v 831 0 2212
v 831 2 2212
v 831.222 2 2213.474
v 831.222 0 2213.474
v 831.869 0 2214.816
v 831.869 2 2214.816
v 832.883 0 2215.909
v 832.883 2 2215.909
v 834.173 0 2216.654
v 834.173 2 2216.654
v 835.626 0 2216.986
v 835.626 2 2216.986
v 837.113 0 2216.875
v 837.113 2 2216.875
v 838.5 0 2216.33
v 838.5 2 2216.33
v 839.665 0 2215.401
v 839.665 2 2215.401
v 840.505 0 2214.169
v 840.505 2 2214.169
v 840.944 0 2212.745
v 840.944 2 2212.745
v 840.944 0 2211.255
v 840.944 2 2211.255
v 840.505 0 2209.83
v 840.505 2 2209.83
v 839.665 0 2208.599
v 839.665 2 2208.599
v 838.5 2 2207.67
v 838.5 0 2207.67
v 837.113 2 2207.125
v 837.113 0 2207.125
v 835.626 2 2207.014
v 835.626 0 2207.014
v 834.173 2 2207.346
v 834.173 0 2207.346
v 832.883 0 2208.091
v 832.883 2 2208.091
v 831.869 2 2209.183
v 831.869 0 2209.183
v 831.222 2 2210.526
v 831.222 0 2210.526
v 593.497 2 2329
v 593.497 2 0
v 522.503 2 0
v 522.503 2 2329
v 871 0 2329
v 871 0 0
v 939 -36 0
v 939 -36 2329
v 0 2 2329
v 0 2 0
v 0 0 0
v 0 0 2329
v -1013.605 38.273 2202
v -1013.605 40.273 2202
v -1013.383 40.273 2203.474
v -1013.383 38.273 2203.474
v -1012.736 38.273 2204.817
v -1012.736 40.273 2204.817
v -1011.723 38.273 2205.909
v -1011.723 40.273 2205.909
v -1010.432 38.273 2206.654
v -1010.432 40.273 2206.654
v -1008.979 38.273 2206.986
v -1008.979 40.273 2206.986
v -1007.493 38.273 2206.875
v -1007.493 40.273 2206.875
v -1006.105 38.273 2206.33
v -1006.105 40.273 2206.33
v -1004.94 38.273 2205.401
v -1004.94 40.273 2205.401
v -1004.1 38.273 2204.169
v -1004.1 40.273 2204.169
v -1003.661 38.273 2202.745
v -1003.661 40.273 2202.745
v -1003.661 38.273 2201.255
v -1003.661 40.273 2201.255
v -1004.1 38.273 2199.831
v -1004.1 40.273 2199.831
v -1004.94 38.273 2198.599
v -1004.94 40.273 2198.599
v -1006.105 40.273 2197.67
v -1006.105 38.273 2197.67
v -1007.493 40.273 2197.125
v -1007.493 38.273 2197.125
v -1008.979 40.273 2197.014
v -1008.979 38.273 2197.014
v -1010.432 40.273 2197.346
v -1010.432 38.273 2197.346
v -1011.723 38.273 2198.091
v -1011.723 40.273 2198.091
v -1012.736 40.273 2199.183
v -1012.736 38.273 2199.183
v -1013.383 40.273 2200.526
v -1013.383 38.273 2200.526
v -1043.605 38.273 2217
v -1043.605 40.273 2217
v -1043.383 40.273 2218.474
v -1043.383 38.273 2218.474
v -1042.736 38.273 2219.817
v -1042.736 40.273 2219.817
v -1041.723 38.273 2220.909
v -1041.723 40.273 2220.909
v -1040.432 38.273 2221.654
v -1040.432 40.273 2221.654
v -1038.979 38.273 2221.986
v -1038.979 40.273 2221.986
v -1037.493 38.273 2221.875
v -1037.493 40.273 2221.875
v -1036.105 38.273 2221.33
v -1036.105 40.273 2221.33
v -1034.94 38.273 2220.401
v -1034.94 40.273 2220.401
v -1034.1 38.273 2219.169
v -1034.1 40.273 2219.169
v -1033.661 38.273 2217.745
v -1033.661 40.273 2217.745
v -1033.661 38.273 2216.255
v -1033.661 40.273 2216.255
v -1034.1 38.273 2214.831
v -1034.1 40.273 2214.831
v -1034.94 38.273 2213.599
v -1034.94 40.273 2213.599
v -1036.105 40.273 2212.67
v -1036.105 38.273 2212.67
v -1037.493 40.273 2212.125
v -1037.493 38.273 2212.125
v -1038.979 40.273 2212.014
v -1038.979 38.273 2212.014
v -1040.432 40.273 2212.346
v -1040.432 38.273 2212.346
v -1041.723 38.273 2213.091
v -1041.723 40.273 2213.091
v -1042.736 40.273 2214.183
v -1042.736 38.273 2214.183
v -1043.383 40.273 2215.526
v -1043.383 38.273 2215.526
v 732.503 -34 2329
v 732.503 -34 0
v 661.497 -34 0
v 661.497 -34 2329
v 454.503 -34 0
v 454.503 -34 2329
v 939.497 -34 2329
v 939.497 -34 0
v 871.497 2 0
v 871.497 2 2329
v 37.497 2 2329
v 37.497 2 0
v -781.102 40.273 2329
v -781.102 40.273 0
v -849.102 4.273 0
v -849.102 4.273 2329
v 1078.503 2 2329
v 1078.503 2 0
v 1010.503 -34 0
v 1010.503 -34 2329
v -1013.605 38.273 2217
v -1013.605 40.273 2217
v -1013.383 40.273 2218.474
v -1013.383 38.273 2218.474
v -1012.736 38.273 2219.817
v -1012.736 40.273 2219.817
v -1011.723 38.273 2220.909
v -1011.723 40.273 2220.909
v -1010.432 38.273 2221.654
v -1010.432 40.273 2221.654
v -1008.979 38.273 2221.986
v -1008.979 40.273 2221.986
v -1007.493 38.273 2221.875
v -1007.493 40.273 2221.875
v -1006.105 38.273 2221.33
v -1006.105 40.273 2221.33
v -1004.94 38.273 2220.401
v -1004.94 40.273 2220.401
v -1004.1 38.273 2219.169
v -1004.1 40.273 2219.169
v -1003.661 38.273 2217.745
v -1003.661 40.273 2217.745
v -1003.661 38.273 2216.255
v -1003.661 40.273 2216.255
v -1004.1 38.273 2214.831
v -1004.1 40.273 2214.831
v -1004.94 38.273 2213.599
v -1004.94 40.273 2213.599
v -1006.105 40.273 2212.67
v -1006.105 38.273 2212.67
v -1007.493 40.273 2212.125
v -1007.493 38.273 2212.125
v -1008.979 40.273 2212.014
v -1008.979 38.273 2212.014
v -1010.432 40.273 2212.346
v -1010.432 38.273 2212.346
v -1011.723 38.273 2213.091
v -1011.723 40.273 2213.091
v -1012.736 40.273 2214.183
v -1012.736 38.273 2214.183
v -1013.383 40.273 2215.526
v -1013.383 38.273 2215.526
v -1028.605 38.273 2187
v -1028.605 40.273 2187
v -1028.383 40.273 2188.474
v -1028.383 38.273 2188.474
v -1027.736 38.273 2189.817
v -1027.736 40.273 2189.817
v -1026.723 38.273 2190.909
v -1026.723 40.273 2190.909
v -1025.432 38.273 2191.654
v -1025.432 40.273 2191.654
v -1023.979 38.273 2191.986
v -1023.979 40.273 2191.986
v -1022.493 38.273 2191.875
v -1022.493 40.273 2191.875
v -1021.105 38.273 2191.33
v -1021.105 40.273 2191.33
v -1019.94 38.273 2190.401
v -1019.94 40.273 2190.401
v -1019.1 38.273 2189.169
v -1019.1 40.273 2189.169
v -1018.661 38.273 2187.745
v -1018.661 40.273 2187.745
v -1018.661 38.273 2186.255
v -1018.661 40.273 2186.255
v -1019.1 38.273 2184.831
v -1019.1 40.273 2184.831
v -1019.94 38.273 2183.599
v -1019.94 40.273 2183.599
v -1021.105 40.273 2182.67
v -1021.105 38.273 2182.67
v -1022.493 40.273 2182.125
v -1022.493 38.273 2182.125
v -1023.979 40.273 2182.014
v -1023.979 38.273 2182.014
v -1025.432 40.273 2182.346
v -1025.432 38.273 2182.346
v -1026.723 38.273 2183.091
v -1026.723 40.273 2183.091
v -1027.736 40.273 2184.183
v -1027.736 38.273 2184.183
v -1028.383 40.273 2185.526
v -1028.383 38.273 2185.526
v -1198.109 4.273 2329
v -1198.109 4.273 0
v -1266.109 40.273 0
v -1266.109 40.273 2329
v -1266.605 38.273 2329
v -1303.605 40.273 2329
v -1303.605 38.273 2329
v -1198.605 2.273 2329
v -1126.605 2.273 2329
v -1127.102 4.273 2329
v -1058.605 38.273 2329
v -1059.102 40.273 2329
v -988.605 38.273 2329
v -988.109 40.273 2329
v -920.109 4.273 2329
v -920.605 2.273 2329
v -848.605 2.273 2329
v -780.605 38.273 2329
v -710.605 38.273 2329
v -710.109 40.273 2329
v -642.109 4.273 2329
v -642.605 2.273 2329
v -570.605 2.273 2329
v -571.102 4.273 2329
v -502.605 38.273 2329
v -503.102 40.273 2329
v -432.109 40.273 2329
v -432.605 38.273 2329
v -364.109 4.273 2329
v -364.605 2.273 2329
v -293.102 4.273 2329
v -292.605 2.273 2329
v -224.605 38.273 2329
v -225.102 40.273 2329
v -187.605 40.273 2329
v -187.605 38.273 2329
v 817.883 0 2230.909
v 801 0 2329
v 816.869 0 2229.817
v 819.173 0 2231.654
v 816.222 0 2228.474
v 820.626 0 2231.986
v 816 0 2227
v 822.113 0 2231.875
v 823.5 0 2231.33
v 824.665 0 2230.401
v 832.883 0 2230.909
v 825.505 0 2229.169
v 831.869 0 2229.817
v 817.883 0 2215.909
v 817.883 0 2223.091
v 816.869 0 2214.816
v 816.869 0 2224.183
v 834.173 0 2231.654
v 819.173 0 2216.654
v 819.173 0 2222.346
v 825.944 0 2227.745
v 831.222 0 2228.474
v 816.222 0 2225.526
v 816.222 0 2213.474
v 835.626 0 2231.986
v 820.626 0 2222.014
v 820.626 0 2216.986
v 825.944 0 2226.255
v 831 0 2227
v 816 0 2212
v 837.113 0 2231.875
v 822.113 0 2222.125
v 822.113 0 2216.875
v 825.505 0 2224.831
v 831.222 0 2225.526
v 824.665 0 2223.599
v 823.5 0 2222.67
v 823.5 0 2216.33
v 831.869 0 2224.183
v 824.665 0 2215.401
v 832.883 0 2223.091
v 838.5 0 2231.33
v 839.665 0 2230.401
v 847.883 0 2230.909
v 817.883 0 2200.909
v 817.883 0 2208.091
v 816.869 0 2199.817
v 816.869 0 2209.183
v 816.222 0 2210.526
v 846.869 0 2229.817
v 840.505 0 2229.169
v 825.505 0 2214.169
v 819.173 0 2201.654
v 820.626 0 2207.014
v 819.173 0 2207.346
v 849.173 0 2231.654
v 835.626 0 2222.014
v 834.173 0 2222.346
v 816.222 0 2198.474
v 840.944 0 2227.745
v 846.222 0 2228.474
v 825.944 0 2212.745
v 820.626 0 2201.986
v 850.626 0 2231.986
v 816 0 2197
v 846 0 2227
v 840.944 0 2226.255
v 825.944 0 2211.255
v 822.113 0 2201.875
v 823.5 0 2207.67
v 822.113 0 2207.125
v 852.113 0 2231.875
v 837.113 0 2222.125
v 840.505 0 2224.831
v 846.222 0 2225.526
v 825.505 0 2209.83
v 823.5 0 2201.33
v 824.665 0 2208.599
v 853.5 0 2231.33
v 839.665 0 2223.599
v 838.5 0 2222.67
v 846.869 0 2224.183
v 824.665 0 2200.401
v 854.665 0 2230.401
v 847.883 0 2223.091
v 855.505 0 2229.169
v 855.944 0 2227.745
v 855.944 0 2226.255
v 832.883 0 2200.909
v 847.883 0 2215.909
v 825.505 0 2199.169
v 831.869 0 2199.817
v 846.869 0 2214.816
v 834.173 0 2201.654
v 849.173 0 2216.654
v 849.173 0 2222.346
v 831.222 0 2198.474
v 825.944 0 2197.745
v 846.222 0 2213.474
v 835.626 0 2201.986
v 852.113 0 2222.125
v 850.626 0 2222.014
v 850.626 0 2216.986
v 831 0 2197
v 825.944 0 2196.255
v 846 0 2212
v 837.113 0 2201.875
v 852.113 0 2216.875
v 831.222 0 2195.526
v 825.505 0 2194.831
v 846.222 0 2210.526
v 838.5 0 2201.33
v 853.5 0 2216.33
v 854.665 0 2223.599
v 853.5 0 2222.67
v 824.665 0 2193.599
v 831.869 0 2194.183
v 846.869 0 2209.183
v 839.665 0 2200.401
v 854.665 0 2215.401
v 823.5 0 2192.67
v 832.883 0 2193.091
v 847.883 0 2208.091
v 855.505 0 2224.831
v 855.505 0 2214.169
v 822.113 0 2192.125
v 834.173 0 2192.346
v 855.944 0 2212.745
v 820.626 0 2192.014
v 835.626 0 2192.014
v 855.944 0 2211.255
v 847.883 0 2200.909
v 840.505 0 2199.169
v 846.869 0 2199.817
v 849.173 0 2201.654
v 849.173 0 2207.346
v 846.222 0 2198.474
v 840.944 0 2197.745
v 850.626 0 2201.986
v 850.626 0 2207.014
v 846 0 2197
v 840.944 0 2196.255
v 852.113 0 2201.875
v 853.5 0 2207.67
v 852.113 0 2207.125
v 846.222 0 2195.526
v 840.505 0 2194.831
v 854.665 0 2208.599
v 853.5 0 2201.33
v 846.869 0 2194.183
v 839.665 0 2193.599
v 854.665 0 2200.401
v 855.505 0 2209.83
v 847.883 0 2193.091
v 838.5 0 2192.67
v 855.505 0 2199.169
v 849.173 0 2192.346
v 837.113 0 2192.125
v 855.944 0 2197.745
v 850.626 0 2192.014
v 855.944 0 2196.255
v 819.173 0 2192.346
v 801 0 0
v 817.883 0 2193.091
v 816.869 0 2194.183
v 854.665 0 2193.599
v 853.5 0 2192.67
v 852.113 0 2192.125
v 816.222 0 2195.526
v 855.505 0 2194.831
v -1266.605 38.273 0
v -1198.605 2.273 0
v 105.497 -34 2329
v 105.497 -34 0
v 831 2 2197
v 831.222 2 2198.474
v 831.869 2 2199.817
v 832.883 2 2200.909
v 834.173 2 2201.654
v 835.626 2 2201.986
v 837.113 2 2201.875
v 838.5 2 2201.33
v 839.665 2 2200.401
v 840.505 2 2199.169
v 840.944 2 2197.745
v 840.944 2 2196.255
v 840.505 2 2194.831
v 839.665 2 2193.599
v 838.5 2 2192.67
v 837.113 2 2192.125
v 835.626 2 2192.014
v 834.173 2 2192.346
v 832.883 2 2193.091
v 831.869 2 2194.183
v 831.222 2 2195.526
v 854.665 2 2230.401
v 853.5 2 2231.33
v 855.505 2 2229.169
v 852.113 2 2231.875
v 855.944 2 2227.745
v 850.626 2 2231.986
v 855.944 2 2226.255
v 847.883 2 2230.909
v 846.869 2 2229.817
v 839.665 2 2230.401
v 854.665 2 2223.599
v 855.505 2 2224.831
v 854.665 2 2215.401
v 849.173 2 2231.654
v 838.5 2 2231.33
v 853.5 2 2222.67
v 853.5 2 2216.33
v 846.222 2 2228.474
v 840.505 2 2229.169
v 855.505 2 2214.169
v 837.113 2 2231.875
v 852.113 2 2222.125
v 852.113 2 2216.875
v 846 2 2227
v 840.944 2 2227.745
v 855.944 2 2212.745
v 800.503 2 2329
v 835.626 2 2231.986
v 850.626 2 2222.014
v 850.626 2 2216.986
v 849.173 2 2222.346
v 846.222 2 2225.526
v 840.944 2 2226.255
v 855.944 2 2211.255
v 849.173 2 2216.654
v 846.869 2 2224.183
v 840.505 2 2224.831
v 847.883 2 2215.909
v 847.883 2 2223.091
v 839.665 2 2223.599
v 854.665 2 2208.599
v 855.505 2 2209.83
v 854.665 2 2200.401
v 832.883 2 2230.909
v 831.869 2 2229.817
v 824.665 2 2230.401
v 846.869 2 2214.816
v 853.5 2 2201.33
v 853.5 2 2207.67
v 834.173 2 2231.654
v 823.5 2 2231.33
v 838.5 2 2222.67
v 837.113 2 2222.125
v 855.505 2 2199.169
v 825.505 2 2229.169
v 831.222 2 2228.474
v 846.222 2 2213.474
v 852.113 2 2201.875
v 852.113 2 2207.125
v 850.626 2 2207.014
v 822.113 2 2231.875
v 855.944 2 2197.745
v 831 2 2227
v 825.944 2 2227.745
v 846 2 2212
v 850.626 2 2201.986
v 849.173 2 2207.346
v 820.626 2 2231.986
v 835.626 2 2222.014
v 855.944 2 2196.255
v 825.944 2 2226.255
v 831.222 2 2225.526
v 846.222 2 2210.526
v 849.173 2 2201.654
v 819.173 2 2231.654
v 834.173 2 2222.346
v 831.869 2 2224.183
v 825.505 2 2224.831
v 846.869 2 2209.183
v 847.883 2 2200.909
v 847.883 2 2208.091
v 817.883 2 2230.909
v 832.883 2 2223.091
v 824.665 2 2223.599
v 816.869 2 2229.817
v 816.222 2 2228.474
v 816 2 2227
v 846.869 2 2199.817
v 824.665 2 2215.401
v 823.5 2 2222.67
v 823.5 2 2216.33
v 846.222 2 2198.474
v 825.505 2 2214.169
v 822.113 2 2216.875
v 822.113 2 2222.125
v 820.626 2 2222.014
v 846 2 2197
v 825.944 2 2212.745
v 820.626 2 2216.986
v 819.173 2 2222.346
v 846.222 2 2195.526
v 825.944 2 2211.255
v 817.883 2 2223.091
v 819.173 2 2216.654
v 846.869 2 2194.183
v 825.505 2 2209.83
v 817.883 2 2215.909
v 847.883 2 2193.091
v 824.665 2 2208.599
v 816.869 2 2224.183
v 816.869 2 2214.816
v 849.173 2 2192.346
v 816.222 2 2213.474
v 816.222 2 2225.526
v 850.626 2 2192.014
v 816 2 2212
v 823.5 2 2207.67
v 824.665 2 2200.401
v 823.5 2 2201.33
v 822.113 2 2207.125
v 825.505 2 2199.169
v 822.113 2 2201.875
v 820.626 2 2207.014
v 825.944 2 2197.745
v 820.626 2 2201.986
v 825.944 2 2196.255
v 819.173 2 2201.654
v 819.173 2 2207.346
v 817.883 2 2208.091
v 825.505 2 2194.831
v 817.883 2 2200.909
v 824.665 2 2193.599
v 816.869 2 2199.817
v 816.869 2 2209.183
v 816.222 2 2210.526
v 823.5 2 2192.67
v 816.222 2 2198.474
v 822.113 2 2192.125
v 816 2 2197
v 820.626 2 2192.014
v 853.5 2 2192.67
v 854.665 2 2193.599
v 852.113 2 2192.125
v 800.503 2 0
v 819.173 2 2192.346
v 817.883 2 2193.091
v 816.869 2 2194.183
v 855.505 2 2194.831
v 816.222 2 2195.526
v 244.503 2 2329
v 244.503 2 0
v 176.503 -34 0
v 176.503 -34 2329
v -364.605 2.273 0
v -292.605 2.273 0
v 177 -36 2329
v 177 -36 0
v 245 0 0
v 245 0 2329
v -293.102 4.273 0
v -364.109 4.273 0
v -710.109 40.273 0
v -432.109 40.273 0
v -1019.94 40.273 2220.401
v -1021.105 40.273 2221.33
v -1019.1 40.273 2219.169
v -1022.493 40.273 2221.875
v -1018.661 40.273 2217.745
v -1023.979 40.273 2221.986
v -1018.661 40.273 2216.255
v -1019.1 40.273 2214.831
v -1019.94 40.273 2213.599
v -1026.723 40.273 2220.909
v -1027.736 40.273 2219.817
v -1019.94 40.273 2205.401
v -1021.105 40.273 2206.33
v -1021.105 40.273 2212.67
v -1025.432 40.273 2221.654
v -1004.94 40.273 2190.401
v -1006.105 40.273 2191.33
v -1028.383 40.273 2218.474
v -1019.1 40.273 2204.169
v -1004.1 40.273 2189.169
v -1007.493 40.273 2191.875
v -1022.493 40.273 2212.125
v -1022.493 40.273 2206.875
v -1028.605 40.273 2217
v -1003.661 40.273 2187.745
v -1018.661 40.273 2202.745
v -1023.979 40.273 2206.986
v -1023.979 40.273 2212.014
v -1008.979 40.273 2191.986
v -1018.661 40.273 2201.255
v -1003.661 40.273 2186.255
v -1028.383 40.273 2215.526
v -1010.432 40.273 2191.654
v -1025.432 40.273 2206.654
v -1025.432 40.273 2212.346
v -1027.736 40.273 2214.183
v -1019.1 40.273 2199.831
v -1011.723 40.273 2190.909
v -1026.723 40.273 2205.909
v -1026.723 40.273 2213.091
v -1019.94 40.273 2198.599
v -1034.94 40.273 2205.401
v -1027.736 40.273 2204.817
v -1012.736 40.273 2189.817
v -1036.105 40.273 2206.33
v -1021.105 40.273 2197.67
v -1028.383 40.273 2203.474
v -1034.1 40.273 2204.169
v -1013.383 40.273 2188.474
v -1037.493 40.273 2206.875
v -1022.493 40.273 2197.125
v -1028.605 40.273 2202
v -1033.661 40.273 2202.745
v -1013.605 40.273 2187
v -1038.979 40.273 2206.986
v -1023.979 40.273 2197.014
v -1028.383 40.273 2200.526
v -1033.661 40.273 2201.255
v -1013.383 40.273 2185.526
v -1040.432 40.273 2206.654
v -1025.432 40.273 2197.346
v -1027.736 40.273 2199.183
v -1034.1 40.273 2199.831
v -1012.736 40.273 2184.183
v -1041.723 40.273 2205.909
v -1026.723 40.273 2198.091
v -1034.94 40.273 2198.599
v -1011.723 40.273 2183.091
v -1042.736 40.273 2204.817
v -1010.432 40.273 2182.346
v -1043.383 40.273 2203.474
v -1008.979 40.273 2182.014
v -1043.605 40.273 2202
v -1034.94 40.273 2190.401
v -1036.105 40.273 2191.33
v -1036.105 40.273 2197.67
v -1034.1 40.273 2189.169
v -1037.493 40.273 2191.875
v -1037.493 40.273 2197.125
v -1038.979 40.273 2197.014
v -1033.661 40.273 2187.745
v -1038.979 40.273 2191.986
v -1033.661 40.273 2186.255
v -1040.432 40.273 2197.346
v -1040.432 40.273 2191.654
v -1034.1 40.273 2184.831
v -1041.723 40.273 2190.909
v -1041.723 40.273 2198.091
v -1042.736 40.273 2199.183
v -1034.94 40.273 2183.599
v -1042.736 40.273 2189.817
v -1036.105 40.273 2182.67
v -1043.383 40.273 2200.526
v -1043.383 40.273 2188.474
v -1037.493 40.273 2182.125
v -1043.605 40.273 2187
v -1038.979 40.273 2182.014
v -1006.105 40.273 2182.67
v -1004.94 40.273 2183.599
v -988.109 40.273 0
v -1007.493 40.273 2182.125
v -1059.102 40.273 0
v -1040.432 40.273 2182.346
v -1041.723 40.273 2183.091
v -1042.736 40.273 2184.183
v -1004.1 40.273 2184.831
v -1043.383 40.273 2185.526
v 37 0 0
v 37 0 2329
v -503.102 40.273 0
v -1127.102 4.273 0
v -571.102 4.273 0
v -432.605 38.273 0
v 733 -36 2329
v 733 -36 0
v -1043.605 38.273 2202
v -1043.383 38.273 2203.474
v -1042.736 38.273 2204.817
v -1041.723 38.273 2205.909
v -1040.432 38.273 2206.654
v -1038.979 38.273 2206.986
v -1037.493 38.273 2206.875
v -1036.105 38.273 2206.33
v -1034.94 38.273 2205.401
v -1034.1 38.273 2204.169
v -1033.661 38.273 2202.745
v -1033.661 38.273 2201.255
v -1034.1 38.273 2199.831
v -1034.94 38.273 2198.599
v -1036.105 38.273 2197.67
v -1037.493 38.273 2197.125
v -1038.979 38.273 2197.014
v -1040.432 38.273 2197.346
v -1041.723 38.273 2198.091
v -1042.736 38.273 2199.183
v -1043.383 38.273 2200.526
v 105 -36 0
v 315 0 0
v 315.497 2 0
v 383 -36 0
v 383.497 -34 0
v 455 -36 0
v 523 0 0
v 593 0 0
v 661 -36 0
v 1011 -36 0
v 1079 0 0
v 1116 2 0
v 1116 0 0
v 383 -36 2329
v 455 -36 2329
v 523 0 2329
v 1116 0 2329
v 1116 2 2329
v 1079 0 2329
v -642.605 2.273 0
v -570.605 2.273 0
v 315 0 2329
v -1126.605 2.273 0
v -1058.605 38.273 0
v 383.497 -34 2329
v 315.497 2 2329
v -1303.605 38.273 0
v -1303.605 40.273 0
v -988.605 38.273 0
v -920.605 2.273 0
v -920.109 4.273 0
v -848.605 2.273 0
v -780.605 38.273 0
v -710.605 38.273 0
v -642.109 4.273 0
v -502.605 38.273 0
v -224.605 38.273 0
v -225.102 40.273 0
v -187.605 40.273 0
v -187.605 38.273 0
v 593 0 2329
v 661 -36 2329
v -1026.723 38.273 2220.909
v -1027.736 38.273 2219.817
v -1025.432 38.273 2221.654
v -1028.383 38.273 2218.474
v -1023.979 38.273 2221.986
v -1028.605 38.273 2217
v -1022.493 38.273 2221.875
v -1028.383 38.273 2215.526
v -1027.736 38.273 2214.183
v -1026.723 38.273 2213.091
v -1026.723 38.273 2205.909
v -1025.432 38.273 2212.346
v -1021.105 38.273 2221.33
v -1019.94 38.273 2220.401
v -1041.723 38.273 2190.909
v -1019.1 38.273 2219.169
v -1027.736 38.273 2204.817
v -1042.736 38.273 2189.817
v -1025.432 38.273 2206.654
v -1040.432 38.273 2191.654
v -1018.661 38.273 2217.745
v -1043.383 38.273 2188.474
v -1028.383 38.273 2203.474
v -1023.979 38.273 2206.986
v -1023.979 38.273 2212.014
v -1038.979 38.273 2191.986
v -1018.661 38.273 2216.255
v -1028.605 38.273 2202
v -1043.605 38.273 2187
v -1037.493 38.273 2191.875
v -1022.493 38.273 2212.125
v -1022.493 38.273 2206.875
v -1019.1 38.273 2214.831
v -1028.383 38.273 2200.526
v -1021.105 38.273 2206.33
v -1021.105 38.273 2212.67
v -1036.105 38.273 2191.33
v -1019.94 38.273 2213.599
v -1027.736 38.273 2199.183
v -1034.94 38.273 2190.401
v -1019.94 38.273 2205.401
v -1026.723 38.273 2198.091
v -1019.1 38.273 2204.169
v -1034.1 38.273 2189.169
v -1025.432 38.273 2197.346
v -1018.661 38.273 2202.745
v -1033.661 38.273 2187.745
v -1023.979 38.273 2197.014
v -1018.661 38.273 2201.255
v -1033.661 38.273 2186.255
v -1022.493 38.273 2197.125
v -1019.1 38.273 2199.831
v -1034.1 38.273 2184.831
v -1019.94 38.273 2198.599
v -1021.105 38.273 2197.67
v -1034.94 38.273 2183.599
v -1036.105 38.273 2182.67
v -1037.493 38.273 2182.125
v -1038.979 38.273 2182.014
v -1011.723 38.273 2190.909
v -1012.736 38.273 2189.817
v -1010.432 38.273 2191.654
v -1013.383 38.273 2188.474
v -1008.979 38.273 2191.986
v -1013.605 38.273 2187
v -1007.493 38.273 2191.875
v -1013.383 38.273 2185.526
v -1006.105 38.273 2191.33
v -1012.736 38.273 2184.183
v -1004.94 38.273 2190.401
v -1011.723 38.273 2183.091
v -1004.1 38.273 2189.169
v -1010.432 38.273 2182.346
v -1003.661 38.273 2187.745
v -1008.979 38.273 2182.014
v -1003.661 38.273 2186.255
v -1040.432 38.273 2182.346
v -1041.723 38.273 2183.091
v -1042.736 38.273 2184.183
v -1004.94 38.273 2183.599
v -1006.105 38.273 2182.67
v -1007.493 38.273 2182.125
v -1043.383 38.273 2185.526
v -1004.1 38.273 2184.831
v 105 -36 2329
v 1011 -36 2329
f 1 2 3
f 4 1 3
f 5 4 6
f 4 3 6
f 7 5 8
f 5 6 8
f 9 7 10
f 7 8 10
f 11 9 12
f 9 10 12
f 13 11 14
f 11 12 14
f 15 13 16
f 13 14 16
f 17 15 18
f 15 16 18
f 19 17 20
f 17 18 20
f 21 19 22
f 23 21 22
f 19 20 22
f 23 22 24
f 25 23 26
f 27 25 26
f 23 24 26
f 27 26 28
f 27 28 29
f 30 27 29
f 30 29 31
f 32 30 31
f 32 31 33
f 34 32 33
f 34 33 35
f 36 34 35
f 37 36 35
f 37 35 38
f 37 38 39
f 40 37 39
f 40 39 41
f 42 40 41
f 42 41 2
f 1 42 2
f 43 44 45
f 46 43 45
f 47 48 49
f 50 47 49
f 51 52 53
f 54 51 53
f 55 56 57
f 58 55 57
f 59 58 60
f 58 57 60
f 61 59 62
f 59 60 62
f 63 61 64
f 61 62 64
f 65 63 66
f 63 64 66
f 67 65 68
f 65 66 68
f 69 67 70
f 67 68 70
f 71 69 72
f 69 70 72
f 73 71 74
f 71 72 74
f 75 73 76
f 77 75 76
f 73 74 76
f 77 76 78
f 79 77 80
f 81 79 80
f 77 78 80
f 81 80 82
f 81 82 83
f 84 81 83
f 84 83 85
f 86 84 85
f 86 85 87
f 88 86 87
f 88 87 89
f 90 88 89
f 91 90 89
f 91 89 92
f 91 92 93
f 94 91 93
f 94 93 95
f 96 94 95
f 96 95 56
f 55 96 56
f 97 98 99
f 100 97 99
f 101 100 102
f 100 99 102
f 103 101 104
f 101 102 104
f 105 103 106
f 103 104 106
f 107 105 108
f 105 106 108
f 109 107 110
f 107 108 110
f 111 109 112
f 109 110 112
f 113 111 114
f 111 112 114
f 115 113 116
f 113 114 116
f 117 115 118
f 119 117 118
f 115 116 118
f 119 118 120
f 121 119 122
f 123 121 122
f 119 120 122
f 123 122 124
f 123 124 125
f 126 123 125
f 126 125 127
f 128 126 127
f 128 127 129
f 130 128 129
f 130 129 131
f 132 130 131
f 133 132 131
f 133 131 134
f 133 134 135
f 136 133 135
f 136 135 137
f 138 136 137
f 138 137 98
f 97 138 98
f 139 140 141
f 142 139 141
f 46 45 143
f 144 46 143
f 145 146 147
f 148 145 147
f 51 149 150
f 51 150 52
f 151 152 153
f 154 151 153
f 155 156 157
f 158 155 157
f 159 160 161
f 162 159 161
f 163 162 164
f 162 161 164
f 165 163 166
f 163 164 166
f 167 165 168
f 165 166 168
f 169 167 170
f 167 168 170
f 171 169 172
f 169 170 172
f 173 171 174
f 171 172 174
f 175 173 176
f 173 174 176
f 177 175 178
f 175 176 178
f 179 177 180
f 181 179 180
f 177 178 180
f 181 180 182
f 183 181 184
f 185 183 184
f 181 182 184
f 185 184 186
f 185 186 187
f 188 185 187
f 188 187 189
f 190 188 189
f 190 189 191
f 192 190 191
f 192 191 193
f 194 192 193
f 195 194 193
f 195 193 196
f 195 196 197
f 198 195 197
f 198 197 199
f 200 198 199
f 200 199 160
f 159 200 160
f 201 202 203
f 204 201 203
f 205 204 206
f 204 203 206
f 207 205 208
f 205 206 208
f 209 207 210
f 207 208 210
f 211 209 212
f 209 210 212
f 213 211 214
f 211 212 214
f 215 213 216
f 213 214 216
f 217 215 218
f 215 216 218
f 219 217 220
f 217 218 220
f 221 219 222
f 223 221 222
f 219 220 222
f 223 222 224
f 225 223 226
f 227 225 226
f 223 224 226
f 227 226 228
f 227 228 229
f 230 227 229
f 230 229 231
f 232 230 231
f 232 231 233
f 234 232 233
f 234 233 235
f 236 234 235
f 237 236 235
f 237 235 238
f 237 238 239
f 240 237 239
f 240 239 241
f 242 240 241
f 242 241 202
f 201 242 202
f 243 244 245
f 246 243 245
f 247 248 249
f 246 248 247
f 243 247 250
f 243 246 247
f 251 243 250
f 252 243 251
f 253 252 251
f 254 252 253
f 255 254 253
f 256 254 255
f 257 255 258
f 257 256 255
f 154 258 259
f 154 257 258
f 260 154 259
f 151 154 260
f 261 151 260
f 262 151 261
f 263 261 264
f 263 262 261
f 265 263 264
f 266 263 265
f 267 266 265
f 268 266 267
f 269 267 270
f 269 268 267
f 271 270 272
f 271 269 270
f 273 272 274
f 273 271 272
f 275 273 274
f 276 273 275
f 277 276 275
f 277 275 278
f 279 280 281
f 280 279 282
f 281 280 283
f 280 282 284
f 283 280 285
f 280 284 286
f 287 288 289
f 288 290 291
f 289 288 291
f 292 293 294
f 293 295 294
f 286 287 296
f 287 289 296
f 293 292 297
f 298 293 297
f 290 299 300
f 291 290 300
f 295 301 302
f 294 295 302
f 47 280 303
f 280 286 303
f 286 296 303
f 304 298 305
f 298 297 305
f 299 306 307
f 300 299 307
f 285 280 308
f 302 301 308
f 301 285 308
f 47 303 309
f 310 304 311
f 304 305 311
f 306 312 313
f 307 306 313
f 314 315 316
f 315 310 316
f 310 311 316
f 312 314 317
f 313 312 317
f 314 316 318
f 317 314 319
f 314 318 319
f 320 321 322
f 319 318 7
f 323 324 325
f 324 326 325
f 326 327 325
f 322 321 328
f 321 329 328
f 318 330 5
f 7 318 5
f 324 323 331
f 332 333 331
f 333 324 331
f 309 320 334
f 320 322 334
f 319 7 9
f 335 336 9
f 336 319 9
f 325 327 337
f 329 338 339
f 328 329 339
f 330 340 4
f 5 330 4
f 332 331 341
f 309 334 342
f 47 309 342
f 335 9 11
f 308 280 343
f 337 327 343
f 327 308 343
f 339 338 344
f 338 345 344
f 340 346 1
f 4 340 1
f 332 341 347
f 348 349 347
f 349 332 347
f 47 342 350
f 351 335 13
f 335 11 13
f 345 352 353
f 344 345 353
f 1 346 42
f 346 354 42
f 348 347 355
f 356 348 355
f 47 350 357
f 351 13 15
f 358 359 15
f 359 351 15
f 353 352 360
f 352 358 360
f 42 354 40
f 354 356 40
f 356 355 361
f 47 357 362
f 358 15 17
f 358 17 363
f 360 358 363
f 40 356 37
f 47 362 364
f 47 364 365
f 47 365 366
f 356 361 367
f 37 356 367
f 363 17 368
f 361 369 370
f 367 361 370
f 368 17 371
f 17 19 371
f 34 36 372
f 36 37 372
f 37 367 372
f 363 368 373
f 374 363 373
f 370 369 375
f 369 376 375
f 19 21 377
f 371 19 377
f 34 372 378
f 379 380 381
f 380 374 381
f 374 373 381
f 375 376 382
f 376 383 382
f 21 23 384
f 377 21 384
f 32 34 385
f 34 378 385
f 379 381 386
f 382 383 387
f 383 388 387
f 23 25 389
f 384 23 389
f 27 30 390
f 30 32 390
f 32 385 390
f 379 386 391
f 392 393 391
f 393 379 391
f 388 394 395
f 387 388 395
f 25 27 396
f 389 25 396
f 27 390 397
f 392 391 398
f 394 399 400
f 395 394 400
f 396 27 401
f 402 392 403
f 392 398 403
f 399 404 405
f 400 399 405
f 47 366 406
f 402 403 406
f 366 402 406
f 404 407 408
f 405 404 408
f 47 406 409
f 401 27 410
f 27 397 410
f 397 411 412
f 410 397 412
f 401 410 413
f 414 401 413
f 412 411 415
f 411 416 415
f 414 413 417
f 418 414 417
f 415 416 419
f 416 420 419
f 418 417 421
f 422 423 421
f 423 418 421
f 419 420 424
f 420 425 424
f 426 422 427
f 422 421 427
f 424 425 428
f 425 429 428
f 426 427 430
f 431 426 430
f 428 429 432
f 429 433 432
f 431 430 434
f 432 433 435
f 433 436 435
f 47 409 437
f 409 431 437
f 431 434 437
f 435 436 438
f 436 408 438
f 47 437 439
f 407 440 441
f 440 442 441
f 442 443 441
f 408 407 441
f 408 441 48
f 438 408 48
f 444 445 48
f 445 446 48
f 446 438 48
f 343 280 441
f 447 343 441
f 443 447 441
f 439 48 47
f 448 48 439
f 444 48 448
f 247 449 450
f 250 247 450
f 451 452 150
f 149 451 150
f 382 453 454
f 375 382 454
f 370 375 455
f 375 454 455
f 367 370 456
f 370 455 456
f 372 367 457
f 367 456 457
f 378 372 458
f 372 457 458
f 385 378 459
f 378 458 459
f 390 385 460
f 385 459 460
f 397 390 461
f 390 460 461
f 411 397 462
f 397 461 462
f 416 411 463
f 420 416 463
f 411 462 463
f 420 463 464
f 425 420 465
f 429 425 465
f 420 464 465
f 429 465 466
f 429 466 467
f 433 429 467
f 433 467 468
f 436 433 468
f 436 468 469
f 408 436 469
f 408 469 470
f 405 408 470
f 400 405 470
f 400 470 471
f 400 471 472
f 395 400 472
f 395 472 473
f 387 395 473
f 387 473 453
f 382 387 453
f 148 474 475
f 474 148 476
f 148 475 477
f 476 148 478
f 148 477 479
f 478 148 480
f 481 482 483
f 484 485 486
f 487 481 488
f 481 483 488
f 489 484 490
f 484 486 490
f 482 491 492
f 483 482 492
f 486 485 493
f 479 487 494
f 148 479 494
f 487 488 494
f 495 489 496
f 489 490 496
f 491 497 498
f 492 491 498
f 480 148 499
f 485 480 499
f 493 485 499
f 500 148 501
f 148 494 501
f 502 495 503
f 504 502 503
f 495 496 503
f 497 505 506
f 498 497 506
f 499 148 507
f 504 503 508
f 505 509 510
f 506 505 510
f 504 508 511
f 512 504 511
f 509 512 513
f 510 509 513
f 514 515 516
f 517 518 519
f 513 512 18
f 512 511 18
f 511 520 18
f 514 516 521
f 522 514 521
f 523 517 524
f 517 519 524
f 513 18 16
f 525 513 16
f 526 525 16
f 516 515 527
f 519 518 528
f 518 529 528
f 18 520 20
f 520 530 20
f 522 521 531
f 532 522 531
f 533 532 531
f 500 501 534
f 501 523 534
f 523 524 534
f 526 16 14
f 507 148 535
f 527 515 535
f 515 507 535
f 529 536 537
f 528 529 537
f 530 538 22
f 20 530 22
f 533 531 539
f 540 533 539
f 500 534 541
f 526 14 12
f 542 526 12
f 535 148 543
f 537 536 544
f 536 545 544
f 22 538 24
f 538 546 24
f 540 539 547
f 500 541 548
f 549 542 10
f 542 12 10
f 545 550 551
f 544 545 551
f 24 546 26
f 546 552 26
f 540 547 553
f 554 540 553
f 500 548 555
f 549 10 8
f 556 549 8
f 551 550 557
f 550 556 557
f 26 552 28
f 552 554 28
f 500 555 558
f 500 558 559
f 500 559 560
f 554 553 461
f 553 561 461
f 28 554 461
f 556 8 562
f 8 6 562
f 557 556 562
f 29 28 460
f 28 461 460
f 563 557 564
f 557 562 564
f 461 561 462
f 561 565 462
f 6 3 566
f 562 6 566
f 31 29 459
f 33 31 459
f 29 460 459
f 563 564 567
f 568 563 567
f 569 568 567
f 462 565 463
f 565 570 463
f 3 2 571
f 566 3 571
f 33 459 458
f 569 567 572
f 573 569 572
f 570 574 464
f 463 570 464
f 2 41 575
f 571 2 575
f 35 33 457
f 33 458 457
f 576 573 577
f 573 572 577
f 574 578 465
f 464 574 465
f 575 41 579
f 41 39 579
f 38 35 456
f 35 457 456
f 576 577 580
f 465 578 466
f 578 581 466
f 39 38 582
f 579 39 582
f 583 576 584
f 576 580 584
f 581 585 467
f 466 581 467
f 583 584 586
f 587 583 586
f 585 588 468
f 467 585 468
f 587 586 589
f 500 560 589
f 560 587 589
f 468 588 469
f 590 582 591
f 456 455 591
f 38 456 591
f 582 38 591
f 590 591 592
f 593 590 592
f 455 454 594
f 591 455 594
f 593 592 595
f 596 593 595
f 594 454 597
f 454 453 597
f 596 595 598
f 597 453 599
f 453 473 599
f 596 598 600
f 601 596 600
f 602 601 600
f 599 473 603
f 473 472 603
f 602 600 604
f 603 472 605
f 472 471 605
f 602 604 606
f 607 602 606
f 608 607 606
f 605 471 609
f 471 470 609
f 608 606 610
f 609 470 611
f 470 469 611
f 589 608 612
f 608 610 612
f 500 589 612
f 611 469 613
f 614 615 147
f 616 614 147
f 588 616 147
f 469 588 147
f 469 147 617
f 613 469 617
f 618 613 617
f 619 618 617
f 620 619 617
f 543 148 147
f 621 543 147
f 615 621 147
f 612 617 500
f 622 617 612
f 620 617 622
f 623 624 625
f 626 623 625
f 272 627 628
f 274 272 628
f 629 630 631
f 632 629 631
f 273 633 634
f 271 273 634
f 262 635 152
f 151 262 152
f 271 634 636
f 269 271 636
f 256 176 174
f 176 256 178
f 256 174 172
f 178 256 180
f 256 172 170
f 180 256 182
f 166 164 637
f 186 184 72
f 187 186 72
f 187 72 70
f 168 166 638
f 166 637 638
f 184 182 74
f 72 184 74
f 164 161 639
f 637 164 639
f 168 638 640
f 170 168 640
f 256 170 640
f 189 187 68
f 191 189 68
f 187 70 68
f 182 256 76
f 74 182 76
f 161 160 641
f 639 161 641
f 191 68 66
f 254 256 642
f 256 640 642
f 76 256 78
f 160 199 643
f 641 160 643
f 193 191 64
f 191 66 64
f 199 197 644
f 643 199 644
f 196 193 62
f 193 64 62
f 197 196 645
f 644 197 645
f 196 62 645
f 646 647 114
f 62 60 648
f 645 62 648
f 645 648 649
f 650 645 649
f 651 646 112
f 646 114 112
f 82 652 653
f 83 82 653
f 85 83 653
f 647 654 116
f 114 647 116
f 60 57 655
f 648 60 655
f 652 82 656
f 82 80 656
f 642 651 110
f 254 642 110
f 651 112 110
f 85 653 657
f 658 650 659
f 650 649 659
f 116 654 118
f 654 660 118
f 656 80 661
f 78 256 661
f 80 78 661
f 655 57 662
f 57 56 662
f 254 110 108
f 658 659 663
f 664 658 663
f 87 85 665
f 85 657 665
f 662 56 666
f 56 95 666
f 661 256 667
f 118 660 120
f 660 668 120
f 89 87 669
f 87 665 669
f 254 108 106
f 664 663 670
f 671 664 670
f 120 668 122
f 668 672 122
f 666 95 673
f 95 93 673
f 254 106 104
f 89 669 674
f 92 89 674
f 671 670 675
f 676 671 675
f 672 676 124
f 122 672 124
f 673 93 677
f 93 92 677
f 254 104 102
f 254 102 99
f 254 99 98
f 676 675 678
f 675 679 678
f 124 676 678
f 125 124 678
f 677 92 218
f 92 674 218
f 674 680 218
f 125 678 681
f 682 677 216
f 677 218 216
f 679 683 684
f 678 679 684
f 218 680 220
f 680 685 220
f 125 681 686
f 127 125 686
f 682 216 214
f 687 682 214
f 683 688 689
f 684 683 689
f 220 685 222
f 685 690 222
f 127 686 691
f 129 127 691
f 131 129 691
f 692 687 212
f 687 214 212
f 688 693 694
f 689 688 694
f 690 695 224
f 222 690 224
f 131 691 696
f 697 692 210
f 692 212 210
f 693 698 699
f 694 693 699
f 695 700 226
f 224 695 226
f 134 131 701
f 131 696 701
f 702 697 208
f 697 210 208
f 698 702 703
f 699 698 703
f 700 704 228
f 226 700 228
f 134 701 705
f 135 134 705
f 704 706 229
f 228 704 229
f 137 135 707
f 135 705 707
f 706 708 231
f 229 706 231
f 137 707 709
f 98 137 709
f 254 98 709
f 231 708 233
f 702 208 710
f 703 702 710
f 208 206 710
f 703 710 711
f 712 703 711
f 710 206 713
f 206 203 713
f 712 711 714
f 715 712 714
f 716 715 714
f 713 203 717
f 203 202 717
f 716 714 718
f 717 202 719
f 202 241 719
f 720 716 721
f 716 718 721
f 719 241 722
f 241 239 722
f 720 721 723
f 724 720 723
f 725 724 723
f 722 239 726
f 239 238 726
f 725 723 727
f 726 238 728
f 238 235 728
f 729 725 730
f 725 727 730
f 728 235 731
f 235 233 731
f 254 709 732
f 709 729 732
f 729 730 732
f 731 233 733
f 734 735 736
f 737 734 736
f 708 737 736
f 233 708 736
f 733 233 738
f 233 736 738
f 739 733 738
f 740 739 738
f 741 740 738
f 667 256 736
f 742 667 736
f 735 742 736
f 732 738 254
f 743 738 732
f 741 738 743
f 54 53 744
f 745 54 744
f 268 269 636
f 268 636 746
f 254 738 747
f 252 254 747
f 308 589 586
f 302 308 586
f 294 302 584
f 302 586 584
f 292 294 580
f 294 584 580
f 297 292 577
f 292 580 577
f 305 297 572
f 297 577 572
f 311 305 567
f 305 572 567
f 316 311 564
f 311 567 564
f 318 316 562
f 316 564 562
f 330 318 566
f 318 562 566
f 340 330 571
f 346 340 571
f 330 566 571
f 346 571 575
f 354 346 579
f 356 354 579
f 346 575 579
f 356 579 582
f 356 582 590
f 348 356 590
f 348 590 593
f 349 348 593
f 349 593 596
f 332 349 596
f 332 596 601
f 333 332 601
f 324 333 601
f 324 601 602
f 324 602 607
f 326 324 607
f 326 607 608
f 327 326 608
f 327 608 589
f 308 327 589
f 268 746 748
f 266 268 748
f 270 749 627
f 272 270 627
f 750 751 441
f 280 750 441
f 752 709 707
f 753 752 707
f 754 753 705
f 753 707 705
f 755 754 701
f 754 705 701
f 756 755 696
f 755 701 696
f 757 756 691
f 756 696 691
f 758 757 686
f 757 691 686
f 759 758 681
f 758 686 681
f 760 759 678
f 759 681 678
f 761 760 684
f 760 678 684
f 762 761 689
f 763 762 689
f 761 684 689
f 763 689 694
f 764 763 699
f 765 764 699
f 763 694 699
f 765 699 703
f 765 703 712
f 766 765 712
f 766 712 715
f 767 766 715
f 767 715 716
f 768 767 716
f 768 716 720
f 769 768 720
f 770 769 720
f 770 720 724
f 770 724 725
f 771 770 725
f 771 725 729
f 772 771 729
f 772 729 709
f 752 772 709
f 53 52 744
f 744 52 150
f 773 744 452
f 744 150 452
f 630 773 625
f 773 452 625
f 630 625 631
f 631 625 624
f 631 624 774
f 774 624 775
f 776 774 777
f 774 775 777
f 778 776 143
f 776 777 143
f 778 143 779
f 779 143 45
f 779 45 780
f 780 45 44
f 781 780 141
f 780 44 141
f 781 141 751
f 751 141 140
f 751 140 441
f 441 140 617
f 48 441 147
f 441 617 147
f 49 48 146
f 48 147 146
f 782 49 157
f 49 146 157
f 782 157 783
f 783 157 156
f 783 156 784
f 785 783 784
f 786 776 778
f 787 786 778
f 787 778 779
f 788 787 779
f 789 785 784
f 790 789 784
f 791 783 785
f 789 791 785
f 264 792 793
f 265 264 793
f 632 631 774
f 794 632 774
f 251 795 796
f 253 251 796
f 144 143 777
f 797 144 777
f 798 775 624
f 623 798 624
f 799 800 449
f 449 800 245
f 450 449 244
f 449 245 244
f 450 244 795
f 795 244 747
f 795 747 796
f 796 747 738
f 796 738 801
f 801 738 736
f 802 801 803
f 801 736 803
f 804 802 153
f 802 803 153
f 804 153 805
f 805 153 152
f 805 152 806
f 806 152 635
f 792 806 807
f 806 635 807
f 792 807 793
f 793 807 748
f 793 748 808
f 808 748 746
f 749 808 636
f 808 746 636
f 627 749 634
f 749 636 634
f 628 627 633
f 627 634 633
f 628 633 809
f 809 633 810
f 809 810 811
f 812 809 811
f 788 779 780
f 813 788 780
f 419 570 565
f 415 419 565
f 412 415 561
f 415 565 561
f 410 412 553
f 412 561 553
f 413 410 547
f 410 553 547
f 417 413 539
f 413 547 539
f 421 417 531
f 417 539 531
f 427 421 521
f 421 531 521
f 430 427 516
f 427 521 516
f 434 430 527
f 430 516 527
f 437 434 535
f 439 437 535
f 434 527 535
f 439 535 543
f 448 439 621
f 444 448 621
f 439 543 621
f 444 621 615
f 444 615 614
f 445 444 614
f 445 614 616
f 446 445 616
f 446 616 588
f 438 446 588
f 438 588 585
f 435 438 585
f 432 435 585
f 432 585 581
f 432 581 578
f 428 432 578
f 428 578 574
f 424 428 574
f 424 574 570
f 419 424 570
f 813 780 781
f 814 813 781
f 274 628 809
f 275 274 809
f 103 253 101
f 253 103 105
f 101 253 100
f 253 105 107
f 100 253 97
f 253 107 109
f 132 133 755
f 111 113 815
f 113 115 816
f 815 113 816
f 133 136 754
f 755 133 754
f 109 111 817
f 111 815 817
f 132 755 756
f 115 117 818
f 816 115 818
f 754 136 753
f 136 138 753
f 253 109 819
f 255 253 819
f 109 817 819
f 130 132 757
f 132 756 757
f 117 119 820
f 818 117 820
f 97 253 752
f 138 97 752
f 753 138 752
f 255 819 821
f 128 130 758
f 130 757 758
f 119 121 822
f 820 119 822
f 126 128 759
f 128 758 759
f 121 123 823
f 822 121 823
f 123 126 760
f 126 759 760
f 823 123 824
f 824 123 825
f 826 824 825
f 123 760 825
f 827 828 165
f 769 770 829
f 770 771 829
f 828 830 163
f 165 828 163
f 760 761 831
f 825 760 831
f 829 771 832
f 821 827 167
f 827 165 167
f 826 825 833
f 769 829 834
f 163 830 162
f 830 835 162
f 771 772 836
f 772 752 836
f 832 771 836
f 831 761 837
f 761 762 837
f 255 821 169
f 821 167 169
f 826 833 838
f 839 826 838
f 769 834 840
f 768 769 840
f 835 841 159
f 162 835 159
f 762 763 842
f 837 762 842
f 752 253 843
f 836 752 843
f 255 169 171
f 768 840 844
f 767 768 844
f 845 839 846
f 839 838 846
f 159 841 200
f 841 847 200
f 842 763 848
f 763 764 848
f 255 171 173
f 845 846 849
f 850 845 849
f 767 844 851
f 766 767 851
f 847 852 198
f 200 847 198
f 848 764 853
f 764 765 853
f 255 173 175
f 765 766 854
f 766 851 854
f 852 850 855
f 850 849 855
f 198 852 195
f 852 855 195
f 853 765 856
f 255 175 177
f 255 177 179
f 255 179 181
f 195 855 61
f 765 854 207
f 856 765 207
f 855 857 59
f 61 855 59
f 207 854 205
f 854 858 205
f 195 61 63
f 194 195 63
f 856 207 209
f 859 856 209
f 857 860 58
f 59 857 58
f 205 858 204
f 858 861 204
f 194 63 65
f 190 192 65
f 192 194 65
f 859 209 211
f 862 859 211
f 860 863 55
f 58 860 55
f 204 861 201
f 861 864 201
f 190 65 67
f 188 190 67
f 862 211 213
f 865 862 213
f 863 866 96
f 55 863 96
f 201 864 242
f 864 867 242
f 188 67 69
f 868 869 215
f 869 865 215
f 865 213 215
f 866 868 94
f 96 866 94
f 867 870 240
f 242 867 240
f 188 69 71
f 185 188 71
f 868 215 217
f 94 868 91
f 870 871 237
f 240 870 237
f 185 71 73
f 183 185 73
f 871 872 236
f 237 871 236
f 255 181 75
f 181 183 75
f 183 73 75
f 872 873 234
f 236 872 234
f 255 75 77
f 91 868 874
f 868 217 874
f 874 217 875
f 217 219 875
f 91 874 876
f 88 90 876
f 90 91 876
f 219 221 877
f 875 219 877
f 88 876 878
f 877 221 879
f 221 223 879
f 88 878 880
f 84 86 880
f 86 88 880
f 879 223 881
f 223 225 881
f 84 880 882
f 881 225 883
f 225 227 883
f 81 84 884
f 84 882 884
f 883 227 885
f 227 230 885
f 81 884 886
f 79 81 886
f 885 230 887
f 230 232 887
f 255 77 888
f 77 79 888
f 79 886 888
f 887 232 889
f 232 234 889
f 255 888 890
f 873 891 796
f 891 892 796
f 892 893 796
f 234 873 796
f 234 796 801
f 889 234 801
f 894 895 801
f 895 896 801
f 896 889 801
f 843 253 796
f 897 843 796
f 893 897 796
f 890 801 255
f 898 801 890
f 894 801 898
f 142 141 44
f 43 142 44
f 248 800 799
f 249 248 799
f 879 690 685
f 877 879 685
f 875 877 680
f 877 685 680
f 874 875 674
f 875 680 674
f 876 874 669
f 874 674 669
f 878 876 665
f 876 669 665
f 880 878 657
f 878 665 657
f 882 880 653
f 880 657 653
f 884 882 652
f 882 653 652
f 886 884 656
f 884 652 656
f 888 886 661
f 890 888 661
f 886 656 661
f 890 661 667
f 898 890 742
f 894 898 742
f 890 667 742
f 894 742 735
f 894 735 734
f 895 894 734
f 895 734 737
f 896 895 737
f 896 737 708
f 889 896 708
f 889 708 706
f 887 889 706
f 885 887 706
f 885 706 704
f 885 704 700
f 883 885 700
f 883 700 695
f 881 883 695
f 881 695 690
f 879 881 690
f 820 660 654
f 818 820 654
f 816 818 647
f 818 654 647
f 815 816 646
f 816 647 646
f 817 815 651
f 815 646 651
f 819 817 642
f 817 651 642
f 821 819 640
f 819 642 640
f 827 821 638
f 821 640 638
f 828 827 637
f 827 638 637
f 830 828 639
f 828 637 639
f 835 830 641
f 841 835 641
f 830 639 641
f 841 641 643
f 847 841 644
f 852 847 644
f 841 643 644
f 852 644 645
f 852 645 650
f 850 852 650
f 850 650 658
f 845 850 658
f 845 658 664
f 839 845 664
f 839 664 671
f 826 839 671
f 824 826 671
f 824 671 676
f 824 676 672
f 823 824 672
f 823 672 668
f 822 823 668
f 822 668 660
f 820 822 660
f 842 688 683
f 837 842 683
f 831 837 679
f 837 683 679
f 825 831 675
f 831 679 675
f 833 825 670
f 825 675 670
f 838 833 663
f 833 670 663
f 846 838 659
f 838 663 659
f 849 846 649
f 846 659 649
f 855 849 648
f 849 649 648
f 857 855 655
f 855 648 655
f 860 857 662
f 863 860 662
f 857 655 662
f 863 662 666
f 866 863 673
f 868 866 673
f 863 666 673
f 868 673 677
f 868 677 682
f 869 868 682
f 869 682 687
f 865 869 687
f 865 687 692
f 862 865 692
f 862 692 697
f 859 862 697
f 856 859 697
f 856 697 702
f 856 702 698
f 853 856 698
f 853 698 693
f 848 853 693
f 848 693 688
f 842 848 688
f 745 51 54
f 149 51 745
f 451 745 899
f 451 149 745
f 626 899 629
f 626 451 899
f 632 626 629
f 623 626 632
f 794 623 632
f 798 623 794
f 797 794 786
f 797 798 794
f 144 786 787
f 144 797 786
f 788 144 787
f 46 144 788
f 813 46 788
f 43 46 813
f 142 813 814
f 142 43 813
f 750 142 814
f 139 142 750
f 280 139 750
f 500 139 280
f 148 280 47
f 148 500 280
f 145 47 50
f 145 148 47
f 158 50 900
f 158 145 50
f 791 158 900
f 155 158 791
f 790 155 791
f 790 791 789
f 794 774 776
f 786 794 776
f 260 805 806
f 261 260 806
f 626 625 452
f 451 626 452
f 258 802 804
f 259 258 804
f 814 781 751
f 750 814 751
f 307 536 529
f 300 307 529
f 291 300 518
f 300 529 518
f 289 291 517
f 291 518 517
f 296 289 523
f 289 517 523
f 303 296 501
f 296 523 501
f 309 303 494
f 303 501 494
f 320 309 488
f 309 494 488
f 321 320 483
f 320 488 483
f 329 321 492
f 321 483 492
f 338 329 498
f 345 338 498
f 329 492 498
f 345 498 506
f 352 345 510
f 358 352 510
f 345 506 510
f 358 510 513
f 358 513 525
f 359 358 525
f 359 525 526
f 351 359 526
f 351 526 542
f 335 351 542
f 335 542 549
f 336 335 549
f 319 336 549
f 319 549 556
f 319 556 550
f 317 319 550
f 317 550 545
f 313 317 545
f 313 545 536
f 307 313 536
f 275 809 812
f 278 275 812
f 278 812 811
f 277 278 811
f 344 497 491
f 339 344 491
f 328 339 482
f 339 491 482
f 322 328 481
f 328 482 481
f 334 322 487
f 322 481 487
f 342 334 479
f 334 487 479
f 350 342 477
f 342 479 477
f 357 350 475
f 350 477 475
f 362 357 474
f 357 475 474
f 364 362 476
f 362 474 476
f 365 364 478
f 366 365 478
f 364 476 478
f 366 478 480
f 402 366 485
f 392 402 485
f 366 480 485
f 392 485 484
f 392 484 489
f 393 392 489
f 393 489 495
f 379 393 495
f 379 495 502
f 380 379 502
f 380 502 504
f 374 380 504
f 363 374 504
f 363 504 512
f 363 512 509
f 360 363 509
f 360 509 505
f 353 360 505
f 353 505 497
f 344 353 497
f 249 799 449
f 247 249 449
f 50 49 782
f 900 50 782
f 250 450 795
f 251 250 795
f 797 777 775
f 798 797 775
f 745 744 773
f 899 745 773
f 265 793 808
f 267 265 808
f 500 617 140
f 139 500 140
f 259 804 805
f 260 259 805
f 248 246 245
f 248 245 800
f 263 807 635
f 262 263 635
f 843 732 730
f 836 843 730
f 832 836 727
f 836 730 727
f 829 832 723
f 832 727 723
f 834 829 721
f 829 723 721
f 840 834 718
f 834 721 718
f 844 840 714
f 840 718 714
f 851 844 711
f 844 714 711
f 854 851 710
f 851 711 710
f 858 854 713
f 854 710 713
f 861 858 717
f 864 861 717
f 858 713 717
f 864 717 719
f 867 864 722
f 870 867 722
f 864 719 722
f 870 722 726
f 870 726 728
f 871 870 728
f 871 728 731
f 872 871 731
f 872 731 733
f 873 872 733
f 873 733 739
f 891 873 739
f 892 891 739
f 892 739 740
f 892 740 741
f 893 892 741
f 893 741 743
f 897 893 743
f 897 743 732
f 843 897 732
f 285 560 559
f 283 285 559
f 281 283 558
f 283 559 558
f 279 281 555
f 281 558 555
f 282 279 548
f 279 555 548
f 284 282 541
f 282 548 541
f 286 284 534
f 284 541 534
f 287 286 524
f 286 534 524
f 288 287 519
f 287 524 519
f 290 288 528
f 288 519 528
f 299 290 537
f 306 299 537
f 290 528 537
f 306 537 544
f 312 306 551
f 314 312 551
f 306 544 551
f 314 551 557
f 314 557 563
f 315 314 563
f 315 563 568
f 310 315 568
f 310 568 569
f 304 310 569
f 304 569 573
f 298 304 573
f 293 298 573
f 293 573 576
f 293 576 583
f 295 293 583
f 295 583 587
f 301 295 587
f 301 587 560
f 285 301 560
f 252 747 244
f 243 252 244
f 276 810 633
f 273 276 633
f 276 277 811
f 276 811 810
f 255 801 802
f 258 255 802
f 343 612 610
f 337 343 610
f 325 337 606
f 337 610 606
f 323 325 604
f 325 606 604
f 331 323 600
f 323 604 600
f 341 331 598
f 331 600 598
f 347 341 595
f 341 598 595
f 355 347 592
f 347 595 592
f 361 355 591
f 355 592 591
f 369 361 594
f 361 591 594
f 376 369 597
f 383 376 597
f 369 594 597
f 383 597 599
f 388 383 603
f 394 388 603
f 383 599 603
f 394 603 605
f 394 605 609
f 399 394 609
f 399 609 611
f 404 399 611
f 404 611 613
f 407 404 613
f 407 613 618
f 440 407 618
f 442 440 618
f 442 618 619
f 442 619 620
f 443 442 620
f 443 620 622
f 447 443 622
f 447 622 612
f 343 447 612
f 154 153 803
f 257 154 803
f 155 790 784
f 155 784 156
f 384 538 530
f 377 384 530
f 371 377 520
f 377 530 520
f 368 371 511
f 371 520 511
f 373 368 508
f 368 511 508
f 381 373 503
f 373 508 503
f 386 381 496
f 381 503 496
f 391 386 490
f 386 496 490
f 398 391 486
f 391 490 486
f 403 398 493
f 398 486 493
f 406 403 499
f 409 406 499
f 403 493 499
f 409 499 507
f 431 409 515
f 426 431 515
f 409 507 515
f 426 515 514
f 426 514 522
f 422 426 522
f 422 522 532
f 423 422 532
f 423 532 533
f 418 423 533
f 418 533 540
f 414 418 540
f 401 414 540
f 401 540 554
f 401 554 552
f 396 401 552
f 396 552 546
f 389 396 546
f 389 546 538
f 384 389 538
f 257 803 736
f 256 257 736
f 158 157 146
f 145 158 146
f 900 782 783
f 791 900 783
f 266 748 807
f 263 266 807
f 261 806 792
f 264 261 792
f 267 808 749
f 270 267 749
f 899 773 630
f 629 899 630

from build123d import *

# Parameters (mm, degrees)
F1_DEPTH = 2329
F3_D     = 10
F5_DEPTH = 2329
F7_D     = 10


with BuildPart() as f1:
    # F0 (on Top) → F1 (new body)
    with BuildSketch(Plane.XY):
        Polygon((0, 2), (0, 0), (37, 0), (105, -36), (177, -36), (245, 0), (315, 0), (383, -36), (455, -36), (523, 0), (593, 0), (661, -36), (733, -36), (801, 0), (871, 0), (939, -36), (1011, -36), (1079, 0), (1116, 0), (1116, 2), (1078.503248, 2), (1010.503248, -34), (939.496752, -34), (871.496752, 2), (800.503248, 2), (732.503248, -34), (661.496752, -34), (593.496752, 2), (522.503248, 2), (454.503248, -34), (383.496752, -34), (315.496752, 2), (244.503248, 2), (176.503248, -34), (105.496752, -34), (37.496752, 2), align=None)
    extrude(amount=F1_DEPTH)

    # F3 (through all)
    with Locations(Plane.XZ):
        with Locations((836, 2227), (851, 2227), (851, 2211.999893), (836, 2211.999893), (821, 2197.000027), (836, 2197.000027), (851, 2197.000027), (821, 2211.999893), (821, 2227)):
            Hole(F3_D / 2)


with BuildPart() as f5:
    # F4 (on Top) → F5 (new body)
    with BuildSketch(Plane.XY):
        Polygon((-1303.605286, 40.272888), (-1303.605286, 38.272888), (-1266.605286, 38.272888), (-1198.605286, 2.272888), (-1126.605286, 2.272888), (-1058.605286, 38.272888), (-988.605286, 38.272888), (-920.605286, 2.272888), (-848.605286, 2.272888), (-780.605286, 38.272888), (-710.605286, 38.272888), (-642.605286, 2.272888), (-570.605286, 2.272888), (-502.605286, 38.272888), (-432.605286, 38.272888), (-364.605286, 2.272888), (-292.605286, 2.272888), (-224.605286, 38.272888), (-187.605286, 38.272888), (-187.605286, 40.272888), (-225.102038, 40.272888), (-293.102038, 4.272888), (-364.108534, 4.272888), (-432.108534, 40.272888), (-503.102038, 40.272888), (-571.102038, 4.272888), (-642.108534, 4.272888), (-710.108534, 40.272888), (-781.102038, 40.272888), (-849.102038, 4.272888), (-920.108534, 4.272888), (-988.108534, 40.272888), (-1059.102038, 40.272888), (-1127.102038, 4.272888), (-1198.108534, 4.272888), (-1266.108534, 40.272888), align=None)
    extrude(amount=F5_DEPTH)

    # F7 (through all)
    with Locations(Plane.XZ.offset(-38.272888)):
        with Locations((-1038.605286, 2217), (-1023.605286, 2217), (-1008.605286, 2217), (-1008.605286, 2202), (-1023.605286, 2202), (-1038.605286, 2202), (-1038.605286, 2187), (-1023.605286, 2187), (-1008.605286, 2187)):
            Hole(F7_D / 2)


solid = Compound([f1.part, f5.part])
